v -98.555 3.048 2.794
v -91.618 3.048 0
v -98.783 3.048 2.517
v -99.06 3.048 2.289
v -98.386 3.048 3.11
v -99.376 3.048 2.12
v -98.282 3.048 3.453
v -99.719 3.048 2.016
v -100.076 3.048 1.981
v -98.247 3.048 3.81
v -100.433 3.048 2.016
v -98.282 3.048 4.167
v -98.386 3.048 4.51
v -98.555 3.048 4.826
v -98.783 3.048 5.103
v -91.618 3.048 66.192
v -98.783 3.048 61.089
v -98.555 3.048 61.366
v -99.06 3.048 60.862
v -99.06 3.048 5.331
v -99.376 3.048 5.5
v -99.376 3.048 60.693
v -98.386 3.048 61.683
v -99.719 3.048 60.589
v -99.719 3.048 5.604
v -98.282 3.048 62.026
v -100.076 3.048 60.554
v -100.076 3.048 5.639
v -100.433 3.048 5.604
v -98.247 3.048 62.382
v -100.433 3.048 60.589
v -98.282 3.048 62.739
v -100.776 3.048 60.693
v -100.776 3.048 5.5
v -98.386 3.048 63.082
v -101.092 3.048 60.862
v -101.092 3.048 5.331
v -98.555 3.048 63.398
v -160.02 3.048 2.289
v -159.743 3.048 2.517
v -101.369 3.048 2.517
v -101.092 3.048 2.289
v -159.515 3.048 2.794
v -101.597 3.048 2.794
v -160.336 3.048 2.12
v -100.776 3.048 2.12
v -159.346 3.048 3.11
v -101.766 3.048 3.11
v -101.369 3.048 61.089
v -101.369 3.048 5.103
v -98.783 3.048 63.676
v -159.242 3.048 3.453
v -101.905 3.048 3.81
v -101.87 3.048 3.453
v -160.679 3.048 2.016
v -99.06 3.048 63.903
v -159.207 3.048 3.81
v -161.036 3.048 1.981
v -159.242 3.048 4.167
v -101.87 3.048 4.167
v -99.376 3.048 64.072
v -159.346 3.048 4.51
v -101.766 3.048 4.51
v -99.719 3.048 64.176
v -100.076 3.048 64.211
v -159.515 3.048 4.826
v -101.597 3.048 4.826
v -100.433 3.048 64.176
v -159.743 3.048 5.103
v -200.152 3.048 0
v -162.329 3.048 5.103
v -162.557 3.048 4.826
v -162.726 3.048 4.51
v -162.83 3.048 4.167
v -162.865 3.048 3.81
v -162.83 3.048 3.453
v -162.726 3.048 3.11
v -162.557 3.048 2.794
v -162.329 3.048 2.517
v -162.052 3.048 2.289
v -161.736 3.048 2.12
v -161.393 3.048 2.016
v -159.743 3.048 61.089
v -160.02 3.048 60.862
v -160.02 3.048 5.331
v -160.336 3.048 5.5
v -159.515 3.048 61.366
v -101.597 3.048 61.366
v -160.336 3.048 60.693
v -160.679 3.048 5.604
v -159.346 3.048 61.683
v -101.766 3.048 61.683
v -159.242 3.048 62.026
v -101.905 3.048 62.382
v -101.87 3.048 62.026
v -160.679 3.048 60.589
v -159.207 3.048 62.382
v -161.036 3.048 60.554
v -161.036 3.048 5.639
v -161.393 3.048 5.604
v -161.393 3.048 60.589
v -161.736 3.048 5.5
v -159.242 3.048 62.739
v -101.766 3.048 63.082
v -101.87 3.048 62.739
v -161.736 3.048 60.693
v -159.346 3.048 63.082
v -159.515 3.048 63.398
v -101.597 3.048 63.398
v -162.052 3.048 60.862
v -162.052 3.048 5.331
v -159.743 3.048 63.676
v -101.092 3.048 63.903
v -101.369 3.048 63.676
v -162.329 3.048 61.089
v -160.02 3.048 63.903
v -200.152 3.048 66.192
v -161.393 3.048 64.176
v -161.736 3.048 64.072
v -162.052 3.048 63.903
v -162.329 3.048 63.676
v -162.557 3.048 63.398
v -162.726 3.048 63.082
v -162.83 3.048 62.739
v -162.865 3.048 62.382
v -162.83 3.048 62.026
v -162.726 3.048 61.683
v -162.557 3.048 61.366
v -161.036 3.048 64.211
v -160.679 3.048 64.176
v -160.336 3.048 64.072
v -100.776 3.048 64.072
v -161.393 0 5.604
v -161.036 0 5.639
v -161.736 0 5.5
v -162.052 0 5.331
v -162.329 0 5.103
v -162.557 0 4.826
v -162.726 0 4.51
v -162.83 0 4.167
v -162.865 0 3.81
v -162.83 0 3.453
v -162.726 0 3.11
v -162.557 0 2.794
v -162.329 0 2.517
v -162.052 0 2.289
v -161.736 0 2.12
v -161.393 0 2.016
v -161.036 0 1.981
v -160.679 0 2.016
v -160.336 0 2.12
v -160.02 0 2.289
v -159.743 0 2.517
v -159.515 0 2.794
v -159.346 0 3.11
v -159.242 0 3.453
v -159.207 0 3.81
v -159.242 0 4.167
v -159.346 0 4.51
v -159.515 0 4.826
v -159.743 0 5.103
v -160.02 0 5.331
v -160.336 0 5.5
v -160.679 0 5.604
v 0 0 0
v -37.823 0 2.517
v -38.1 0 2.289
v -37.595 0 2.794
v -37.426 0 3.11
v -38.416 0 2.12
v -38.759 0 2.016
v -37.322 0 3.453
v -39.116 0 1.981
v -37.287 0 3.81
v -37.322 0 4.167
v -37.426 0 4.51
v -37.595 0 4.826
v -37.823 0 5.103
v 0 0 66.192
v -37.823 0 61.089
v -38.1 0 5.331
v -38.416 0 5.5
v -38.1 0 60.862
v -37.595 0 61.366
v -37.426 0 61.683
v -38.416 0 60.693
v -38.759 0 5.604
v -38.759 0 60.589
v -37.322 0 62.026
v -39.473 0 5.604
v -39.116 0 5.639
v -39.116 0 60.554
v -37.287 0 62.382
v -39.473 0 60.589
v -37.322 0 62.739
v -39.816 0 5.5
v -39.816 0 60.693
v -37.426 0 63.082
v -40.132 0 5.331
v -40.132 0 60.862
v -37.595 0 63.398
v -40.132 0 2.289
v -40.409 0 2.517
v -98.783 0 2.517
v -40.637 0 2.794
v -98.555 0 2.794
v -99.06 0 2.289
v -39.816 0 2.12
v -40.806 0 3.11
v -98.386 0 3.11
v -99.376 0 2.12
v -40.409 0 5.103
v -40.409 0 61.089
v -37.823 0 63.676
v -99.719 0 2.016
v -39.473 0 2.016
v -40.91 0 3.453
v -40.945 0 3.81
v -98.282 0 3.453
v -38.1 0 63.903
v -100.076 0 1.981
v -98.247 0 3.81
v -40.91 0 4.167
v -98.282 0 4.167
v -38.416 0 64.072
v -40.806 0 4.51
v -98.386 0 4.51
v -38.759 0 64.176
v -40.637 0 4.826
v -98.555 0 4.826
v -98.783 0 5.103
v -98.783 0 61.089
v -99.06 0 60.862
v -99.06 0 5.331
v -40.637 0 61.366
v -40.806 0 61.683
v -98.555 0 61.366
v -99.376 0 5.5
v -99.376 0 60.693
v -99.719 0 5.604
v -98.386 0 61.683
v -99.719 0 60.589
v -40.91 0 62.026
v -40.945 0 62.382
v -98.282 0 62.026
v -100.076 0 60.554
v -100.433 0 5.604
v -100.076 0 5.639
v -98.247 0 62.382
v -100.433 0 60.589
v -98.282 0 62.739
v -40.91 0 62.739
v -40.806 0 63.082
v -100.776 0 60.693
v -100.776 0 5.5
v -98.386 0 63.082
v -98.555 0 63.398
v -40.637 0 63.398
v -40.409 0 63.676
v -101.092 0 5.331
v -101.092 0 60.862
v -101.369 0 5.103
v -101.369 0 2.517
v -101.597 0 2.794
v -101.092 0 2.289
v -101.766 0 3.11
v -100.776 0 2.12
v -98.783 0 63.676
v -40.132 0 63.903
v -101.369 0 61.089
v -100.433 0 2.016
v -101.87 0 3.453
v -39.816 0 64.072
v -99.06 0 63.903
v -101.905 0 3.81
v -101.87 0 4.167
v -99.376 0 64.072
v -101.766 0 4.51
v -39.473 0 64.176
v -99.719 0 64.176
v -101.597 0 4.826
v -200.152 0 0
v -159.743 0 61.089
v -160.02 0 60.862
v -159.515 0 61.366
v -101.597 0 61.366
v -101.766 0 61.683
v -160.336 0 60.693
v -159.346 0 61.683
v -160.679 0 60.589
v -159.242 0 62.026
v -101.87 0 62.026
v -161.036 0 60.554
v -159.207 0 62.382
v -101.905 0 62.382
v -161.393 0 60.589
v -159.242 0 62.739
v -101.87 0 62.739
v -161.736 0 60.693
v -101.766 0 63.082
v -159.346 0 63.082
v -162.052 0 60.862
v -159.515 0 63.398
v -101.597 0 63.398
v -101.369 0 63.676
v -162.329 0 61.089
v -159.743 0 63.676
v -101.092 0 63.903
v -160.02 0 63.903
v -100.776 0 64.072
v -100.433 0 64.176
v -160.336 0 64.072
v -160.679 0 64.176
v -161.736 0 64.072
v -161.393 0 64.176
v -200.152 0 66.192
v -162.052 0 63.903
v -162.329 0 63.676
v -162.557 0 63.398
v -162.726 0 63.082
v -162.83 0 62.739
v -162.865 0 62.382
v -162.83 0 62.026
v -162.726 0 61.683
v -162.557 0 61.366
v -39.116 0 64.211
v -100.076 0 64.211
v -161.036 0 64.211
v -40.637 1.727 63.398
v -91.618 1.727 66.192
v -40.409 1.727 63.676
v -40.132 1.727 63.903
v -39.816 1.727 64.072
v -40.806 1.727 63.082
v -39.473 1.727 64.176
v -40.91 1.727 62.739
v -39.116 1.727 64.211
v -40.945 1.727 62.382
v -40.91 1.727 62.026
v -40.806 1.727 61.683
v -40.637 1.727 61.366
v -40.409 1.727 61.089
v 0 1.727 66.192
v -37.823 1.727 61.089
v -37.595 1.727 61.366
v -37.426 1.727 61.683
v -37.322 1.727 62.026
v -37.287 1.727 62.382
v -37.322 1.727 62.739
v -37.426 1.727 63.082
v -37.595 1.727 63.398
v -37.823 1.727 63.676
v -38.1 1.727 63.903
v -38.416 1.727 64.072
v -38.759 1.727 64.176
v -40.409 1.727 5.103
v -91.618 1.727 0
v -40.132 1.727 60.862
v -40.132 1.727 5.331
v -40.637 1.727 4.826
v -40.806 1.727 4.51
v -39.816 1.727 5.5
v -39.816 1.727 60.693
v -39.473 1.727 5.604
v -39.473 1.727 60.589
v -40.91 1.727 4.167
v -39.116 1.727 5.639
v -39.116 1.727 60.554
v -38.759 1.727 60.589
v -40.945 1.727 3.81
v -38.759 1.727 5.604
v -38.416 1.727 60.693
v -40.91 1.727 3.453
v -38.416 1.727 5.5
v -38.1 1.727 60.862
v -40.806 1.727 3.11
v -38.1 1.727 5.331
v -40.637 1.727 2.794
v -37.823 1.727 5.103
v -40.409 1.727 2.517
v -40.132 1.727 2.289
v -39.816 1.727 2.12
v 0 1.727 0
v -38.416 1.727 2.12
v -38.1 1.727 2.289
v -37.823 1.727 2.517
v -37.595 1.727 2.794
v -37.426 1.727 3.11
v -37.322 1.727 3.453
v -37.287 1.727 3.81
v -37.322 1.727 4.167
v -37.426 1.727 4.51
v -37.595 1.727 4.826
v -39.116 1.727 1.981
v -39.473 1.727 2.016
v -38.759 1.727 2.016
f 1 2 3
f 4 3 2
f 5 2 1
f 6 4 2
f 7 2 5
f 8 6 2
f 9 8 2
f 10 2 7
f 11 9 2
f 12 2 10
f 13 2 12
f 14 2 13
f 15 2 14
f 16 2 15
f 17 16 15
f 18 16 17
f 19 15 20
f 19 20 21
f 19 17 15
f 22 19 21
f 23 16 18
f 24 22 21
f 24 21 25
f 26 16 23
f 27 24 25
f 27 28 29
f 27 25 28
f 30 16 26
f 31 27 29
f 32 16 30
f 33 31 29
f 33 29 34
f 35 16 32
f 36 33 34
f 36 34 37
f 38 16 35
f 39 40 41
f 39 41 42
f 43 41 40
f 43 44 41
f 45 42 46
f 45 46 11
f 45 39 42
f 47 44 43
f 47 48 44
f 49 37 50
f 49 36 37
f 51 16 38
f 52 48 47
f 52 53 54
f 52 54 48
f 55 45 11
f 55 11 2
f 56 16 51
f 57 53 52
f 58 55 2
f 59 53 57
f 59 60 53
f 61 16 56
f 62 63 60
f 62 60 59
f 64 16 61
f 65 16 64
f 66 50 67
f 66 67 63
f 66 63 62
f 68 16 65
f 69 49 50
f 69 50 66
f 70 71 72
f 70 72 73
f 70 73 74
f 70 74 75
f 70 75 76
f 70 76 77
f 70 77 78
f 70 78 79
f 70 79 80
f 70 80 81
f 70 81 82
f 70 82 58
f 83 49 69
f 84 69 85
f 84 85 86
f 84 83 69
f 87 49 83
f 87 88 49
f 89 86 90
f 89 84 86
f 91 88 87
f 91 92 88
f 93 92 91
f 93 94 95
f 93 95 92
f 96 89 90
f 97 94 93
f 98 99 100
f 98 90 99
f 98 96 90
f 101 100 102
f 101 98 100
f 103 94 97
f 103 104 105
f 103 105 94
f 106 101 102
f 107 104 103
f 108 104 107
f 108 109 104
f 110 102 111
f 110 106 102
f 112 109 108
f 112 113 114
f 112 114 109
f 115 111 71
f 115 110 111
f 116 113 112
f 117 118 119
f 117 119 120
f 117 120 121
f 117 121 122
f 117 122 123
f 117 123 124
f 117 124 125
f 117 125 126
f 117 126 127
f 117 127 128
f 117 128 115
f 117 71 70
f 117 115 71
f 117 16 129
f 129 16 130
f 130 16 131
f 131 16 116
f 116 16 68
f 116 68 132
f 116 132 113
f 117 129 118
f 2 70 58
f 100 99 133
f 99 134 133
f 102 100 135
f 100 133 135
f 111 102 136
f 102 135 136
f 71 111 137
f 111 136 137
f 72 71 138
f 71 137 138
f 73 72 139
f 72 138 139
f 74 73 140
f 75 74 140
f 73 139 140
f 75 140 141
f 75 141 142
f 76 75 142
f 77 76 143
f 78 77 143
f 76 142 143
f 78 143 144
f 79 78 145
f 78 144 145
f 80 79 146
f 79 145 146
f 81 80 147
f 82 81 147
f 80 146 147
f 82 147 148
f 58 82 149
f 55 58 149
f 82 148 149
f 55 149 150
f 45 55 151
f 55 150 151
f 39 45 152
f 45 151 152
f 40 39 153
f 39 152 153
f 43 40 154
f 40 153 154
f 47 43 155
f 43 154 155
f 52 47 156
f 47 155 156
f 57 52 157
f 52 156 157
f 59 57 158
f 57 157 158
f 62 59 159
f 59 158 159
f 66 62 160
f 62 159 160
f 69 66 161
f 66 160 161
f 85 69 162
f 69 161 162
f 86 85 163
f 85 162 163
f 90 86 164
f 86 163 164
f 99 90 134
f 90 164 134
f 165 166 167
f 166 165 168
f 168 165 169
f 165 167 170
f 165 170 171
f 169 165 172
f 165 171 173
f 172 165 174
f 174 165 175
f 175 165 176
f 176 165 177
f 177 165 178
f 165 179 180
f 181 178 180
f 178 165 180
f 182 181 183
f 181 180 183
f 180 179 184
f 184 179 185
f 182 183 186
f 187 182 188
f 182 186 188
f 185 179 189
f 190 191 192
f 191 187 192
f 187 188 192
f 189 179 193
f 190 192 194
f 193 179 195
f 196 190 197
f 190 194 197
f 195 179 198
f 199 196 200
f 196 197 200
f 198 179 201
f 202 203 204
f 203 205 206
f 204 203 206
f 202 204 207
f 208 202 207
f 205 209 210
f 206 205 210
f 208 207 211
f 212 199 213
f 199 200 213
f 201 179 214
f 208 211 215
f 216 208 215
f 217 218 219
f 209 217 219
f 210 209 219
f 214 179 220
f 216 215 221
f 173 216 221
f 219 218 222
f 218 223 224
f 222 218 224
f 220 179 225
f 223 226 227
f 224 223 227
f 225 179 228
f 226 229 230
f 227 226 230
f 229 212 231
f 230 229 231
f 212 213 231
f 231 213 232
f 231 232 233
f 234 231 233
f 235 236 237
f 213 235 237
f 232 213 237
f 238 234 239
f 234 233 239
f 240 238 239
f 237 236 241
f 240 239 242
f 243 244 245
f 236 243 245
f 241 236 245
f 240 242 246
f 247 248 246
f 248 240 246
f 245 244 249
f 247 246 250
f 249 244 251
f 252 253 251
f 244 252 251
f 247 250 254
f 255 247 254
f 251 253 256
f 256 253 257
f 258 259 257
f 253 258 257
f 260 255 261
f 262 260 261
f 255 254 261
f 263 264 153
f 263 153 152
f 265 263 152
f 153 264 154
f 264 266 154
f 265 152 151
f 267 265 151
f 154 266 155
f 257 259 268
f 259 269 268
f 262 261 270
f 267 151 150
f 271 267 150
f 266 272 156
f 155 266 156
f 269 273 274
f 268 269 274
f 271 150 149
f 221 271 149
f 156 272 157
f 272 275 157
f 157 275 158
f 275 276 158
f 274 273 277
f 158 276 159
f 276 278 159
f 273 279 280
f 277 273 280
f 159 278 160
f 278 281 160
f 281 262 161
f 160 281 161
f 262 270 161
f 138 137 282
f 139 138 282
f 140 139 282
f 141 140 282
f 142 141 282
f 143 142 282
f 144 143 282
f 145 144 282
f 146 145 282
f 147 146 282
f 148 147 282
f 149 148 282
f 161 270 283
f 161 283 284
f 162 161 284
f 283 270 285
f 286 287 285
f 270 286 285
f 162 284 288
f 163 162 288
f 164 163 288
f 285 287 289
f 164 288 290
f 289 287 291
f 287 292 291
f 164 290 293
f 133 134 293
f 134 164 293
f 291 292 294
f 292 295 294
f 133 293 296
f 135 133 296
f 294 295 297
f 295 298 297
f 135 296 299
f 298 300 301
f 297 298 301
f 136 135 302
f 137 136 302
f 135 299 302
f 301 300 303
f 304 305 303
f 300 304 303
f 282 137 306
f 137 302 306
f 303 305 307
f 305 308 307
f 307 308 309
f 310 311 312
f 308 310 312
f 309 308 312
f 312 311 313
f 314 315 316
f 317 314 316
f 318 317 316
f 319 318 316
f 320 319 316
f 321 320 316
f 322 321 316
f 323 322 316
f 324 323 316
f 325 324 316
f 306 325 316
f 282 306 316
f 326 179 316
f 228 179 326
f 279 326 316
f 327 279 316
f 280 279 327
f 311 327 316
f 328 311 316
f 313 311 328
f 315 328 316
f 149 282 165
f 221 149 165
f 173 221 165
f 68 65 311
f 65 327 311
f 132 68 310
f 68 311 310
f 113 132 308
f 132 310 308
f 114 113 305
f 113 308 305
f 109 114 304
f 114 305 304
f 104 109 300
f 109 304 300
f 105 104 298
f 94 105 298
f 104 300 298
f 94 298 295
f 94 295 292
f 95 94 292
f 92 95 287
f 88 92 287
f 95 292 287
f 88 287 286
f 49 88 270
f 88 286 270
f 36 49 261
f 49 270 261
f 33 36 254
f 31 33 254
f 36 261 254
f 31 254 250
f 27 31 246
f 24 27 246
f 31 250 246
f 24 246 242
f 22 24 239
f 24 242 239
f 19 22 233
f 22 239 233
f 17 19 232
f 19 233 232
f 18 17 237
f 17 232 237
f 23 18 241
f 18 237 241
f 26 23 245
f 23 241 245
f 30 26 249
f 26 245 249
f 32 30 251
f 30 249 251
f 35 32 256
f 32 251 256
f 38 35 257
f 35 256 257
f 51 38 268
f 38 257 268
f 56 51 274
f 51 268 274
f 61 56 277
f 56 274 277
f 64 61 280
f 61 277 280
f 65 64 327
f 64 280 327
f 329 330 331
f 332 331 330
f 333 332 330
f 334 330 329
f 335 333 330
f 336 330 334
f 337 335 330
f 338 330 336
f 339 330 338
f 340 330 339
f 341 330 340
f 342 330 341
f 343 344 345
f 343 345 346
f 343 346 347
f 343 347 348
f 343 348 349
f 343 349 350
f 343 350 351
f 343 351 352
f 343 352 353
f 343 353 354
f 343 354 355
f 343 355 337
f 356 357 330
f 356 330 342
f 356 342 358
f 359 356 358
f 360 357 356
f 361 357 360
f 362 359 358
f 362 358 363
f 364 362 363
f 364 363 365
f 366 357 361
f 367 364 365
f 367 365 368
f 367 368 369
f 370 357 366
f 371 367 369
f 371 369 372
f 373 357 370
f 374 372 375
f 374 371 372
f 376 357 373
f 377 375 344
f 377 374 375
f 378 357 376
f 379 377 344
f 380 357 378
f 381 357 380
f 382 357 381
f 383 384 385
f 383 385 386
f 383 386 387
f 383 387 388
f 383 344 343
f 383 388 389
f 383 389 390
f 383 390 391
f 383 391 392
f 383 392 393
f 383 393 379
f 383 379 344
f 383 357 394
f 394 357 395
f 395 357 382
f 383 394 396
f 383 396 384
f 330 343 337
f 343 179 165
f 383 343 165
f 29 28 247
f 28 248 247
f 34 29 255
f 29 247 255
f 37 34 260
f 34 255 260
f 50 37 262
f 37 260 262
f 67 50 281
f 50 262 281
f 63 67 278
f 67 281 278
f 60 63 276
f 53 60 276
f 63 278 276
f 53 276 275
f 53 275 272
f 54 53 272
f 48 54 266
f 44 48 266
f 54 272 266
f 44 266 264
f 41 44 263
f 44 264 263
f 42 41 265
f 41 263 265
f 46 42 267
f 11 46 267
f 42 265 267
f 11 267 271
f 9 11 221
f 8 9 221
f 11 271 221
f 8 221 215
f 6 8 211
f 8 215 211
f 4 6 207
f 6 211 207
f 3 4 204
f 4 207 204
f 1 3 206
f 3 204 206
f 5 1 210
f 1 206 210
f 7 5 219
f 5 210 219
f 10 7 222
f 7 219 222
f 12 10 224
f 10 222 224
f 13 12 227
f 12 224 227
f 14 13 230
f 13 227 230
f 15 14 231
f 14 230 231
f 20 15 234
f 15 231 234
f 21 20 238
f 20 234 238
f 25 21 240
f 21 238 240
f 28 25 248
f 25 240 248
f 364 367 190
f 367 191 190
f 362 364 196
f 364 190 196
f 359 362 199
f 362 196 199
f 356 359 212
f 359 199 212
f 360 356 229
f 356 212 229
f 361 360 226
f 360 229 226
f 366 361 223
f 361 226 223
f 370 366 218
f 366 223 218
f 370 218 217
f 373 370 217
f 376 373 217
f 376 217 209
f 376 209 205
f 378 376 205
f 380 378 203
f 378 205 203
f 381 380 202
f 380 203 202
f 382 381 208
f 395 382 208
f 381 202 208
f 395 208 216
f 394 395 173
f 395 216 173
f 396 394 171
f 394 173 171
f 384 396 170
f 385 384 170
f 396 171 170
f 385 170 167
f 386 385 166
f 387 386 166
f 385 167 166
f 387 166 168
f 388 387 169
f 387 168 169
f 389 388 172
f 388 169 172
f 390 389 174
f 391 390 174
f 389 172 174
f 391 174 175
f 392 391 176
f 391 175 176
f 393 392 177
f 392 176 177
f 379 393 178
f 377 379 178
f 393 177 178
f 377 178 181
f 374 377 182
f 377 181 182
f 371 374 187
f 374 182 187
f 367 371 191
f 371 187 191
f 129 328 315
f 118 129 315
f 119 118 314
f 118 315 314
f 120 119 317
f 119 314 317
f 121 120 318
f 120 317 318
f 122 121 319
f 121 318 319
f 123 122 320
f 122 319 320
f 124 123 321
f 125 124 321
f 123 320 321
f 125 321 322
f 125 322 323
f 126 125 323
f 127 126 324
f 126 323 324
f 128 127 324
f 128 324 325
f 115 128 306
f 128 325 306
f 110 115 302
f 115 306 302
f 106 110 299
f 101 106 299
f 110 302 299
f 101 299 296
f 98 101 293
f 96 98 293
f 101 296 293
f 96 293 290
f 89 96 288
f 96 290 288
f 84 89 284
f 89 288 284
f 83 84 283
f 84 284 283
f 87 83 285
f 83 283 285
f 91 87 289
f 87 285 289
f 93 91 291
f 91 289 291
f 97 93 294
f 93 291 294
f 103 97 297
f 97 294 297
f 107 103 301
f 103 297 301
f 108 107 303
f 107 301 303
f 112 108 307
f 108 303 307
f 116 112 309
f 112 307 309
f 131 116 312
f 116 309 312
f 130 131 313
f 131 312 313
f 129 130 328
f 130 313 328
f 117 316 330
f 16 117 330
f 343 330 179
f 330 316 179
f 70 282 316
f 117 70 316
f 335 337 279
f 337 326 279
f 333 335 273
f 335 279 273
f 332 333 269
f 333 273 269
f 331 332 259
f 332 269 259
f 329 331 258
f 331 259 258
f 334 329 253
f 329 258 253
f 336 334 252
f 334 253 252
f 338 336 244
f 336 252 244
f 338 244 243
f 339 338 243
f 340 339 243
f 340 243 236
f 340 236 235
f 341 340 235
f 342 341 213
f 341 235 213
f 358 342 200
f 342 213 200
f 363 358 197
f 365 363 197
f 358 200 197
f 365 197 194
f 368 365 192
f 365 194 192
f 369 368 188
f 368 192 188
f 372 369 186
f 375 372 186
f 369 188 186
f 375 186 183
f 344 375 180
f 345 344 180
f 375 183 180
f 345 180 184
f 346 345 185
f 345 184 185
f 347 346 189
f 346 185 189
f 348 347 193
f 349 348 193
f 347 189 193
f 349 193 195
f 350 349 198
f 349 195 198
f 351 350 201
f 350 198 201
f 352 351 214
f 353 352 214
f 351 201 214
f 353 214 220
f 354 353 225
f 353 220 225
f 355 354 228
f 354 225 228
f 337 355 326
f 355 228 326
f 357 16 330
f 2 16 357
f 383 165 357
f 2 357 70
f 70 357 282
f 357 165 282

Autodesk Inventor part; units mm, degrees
ref_plane "YZ Plane" through (0, 0, 0) normal (1, 0, 0) x (0, 1, 0)
ref_plane "XZ Plane" through (0, 0, 0) normal (0, 1, 0) x (-1, 0, 0)
ref_plane "XY Plane" through (0, 0, 0) normal (0, 0, 1) x (1, 0, 0)
sketch "Sketch1" plane through (0, 0, 0) normal (0, 1, 0) x (-1, 0, 0)
  line L0 (0, 0) -> (200.152, 0)
  line L1 (200.152, 0) -> (200.152, 66.1924)
  line L2 (200.152, 66.1924) -> (0, 66.1924)
  line L3 (0, 66.1924) -> (0, 0)
  dimension "d0" = 66.1924
  dimension "d1" = 200.152
extrude "Extrusion1" add sketch "Sketch1" along normal blind 3.048
sketch "Sketch2" plane through (0, 3.048, 0) normal (0, 1, 0) x (1, 0, 0)
  line L0 (-200.152, -66.1924) -> (0, -66.1924) projected
  line L1 (-100.076, -66.1924) -> (-100.076, 0) construction
  line L2 (0, 0) -> (-200.152, 0) projected
  point P0 (-100.076, -62.3824)
  point P1 (-100.076, -3.81)
  point P2 (-39.116, -62.3824)
  point P3 (-39.116, -3.81)
  point P4 (-161.036, -3.81)
  point P5 (-161.036, -62.3824)
  dimension "d4" = 3.81
  dimension "d5" = 3.81
  dimension "d6" = 60.96
  dimension "d7" = 60.96
hole "Hole1" at (-100.076, 3.048, 62.3824) at (-100.076, 3.048, 3.81) at (-39.116, 3.048, 62.3824) at (-39.116, 3.048, 3.81) at (-161.036, 3.048, 3.81) at (-161.036, 3.048, 62.3824) direction (0, -1, 0) diameter 3.6576 end through all
sketch "Sketch3" plane through (0, 3.048, 0) normal (0, 1, 0) x (1, 0, 0)
  line L0 (0, -66.1924) -> (0, 0) projected
  line L1 (0, -66.1924) -> (-91.6178, -66.1924)
  line L2 (-91.6178, -66.1924) -> (-91.6178, 0)
  line L3 (-91.6178, 0) -> (0, 0)
  line L4 (0, 0) -> (0, -66.1924)
  line L5 (0, 0) -> (-200.152, 0) projected
  point P0 (-100.076, 0)
  dimension "d15" = 8.4582
extrude "Extrusion2" cut sketch "Sketch3" against normal blind 1.3208
properties part number "TopLayerPlate"
